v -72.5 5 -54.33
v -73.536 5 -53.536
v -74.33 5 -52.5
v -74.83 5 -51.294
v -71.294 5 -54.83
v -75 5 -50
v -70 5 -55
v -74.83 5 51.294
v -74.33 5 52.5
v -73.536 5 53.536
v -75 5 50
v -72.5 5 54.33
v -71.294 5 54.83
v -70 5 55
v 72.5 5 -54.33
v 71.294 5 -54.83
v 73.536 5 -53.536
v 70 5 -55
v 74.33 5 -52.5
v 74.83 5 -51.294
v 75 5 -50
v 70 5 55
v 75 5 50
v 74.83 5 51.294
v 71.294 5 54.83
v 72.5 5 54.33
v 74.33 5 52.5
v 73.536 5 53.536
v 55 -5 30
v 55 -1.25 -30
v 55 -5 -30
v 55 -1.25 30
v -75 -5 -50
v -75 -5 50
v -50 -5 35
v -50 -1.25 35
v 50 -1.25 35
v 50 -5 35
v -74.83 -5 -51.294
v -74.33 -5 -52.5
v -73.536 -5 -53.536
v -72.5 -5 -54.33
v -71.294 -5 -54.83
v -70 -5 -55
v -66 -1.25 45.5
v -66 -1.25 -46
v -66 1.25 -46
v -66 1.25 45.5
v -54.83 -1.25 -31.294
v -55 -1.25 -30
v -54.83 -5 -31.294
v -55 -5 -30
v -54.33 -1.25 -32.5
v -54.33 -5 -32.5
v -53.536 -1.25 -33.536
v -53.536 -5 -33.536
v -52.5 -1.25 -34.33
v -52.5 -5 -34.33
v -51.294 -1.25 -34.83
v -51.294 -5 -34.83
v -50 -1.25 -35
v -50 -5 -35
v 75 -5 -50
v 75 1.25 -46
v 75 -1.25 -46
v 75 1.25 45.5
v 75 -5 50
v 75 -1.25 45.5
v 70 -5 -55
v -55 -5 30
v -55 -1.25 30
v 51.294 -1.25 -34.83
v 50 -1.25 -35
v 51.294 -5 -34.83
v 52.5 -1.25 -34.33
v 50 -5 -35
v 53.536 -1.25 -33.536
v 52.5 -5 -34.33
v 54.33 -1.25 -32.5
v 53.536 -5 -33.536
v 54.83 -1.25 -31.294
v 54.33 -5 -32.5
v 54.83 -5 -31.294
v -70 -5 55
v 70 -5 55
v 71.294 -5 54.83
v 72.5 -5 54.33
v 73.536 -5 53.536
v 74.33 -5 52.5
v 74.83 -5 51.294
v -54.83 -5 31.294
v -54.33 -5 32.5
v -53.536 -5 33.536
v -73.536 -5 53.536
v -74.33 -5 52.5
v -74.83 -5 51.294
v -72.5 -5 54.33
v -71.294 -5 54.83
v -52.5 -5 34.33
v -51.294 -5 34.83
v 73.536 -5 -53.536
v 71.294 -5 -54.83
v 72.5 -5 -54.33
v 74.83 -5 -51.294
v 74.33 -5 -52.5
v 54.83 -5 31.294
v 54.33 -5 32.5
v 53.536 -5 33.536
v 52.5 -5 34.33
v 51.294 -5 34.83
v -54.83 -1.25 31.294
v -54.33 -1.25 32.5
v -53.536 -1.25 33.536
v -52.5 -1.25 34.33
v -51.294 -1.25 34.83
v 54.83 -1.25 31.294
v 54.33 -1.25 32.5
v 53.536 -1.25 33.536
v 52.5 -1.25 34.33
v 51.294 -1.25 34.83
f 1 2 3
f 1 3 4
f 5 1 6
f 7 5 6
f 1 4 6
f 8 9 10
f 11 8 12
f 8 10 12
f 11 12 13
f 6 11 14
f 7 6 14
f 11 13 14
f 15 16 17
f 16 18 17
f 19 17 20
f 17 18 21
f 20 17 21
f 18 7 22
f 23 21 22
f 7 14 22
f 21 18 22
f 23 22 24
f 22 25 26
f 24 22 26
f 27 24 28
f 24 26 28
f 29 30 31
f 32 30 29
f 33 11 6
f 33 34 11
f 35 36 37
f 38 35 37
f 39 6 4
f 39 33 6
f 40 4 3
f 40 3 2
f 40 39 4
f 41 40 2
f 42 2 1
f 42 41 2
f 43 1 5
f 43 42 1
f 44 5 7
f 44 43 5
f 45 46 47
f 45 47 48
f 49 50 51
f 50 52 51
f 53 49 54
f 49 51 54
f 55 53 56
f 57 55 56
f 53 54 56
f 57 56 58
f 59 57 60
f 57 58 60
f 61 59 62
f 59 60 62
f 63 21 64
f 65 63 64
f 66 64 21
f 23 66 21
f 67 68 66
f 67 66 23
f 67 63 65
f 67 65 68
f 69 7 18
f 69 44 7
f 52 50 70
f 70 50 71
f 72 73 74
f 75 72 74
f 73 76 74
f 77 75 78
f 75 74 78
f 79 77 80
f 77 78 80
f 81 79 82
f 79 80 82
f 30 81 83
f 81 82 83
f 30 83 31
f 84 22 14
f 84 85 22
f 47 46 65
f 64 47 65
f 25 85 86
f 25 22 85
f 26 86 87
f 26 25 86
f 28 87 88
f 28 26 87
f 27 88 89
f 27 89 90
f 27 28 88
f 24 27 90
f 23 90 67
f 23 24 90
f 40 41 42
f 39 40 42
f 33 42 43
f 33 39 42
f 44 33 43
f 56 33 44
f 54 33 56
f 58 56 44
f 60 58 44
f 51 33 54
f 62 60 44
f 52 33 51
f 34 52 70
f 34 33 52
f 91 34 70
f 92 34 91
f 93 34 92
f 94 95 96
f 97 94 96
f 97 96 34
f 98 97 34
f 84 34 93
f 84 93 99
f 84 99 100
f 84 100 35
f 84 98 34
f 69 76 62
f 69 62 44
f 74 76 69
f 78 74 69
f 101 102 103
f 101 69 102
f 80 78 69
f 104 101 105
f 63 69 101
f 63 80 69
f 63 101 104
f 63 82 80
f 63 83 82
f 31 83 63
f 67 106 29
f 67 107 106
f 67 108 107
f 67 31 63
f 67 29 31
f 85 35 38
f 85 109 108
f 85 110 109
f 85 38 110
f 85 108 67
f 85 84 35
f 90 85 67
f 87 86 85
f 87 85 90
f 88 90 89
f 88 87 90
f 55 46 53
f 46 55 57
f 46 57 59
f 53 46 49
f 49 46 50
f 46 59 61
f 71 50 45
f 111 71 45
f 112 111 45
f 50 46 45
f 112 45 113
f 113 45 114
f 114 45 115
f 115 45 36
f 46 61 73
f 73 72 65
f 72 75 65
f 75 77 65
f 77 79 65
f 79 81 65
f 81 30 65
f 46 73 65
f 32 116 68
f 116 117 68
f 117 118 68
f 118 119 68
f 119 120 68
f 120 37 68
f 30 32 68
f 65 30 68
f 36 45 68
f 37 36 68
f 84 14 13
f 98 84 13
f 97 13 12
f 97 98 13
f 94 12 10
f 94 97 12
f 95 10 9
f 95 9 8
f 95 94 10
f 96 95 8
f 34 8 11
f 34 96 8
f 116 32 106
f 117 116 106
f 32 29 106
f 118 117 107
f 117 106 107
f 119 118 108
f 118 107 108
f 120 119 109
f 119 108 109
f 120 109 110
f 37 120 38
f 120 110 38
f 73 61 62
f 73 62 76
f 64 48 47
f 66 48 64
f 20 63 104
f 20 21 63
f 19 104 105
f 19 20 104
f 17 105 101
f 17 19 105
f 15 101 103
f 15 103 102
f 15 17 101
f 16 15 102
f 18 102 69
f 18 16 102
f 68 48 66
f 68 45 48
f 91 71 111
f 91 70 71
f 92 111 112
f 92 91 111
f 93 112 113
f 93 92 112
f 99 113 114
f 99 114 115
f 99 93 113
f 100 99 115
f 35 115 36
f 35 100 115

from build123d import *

# Parameters (mm, degrees)
F0_W     = 141
F0_H     = 91.5
F0_W_2   = 110
F0_H_2   = 70
F1_DEPTH = 5
F2_DEPTH = 1.25
F3_DEPTH = 5.001
F4_R     = 5
F5_R     = 5


with BuildPart() as f1:
    # F0 (on Front) → F1 (new body, symmetric)
    with BuildSketch(Plane.XZ):
        Polygon((75, 45.5), (75, 55), (-75, 55), (-75, -55), (75, -55), (75, -46), (-66, -46), (-66, 45.5), align=None)
        with Locations((4.5, -0.25)):
            Rectangle(F0_W, F0_H)
        Rectangle(F0_W_2, F0_H_2, mode=Mode.SUBTRACT)
        Rectangle(F0_W_2, F0_H_2)
    extrude(amount=F1_DEPTH, both=True)

    # F0 (on Front) → F2 (cut, symmetric)
    with BuildSketch(Plane.XZ):
        with Locations((4.5, -0.25)):
            Rectangle(F0_W, F0_H)
        Rectangle(F0_W_2, F0_H_2, mode=Mode.SUBTRACT)
        Rectangle(F0_W_2, F0_H_2)
    extrude(amount=F2_DEPTH, both=True, mode=Mode.SUBTRACT)

    # F0 (on Front) → F3 (cut, through all)
    with BuildSketch(Plane.XZ):
        Rectangle(F0_W_2, F0_H_2)
    extrude(amount=F3_DEPTH, mode=Mode.SUBTRACT)

    # F4
    f4_edges = [f1.edges().sort_by_distance(p)[0] for p in [
        (-75, 0, 55),
        (75, 0, 55),
        (75, 0, -55),
        (-75, 0, -55),
    ]]
    fillet(f4_edges, radius=F4_R)

    # F5
    f5_edges = [f1.edges().sort_by_distance(p)[0] for p in [
        (-55, -3.125, 35),
        (55, -3.125, 35),
        (55, -3.125, -35),
        (-55, -3.125, -35),
    ]]
    fillet(f5_edges, radius=F5_R)


solid = f1.part
